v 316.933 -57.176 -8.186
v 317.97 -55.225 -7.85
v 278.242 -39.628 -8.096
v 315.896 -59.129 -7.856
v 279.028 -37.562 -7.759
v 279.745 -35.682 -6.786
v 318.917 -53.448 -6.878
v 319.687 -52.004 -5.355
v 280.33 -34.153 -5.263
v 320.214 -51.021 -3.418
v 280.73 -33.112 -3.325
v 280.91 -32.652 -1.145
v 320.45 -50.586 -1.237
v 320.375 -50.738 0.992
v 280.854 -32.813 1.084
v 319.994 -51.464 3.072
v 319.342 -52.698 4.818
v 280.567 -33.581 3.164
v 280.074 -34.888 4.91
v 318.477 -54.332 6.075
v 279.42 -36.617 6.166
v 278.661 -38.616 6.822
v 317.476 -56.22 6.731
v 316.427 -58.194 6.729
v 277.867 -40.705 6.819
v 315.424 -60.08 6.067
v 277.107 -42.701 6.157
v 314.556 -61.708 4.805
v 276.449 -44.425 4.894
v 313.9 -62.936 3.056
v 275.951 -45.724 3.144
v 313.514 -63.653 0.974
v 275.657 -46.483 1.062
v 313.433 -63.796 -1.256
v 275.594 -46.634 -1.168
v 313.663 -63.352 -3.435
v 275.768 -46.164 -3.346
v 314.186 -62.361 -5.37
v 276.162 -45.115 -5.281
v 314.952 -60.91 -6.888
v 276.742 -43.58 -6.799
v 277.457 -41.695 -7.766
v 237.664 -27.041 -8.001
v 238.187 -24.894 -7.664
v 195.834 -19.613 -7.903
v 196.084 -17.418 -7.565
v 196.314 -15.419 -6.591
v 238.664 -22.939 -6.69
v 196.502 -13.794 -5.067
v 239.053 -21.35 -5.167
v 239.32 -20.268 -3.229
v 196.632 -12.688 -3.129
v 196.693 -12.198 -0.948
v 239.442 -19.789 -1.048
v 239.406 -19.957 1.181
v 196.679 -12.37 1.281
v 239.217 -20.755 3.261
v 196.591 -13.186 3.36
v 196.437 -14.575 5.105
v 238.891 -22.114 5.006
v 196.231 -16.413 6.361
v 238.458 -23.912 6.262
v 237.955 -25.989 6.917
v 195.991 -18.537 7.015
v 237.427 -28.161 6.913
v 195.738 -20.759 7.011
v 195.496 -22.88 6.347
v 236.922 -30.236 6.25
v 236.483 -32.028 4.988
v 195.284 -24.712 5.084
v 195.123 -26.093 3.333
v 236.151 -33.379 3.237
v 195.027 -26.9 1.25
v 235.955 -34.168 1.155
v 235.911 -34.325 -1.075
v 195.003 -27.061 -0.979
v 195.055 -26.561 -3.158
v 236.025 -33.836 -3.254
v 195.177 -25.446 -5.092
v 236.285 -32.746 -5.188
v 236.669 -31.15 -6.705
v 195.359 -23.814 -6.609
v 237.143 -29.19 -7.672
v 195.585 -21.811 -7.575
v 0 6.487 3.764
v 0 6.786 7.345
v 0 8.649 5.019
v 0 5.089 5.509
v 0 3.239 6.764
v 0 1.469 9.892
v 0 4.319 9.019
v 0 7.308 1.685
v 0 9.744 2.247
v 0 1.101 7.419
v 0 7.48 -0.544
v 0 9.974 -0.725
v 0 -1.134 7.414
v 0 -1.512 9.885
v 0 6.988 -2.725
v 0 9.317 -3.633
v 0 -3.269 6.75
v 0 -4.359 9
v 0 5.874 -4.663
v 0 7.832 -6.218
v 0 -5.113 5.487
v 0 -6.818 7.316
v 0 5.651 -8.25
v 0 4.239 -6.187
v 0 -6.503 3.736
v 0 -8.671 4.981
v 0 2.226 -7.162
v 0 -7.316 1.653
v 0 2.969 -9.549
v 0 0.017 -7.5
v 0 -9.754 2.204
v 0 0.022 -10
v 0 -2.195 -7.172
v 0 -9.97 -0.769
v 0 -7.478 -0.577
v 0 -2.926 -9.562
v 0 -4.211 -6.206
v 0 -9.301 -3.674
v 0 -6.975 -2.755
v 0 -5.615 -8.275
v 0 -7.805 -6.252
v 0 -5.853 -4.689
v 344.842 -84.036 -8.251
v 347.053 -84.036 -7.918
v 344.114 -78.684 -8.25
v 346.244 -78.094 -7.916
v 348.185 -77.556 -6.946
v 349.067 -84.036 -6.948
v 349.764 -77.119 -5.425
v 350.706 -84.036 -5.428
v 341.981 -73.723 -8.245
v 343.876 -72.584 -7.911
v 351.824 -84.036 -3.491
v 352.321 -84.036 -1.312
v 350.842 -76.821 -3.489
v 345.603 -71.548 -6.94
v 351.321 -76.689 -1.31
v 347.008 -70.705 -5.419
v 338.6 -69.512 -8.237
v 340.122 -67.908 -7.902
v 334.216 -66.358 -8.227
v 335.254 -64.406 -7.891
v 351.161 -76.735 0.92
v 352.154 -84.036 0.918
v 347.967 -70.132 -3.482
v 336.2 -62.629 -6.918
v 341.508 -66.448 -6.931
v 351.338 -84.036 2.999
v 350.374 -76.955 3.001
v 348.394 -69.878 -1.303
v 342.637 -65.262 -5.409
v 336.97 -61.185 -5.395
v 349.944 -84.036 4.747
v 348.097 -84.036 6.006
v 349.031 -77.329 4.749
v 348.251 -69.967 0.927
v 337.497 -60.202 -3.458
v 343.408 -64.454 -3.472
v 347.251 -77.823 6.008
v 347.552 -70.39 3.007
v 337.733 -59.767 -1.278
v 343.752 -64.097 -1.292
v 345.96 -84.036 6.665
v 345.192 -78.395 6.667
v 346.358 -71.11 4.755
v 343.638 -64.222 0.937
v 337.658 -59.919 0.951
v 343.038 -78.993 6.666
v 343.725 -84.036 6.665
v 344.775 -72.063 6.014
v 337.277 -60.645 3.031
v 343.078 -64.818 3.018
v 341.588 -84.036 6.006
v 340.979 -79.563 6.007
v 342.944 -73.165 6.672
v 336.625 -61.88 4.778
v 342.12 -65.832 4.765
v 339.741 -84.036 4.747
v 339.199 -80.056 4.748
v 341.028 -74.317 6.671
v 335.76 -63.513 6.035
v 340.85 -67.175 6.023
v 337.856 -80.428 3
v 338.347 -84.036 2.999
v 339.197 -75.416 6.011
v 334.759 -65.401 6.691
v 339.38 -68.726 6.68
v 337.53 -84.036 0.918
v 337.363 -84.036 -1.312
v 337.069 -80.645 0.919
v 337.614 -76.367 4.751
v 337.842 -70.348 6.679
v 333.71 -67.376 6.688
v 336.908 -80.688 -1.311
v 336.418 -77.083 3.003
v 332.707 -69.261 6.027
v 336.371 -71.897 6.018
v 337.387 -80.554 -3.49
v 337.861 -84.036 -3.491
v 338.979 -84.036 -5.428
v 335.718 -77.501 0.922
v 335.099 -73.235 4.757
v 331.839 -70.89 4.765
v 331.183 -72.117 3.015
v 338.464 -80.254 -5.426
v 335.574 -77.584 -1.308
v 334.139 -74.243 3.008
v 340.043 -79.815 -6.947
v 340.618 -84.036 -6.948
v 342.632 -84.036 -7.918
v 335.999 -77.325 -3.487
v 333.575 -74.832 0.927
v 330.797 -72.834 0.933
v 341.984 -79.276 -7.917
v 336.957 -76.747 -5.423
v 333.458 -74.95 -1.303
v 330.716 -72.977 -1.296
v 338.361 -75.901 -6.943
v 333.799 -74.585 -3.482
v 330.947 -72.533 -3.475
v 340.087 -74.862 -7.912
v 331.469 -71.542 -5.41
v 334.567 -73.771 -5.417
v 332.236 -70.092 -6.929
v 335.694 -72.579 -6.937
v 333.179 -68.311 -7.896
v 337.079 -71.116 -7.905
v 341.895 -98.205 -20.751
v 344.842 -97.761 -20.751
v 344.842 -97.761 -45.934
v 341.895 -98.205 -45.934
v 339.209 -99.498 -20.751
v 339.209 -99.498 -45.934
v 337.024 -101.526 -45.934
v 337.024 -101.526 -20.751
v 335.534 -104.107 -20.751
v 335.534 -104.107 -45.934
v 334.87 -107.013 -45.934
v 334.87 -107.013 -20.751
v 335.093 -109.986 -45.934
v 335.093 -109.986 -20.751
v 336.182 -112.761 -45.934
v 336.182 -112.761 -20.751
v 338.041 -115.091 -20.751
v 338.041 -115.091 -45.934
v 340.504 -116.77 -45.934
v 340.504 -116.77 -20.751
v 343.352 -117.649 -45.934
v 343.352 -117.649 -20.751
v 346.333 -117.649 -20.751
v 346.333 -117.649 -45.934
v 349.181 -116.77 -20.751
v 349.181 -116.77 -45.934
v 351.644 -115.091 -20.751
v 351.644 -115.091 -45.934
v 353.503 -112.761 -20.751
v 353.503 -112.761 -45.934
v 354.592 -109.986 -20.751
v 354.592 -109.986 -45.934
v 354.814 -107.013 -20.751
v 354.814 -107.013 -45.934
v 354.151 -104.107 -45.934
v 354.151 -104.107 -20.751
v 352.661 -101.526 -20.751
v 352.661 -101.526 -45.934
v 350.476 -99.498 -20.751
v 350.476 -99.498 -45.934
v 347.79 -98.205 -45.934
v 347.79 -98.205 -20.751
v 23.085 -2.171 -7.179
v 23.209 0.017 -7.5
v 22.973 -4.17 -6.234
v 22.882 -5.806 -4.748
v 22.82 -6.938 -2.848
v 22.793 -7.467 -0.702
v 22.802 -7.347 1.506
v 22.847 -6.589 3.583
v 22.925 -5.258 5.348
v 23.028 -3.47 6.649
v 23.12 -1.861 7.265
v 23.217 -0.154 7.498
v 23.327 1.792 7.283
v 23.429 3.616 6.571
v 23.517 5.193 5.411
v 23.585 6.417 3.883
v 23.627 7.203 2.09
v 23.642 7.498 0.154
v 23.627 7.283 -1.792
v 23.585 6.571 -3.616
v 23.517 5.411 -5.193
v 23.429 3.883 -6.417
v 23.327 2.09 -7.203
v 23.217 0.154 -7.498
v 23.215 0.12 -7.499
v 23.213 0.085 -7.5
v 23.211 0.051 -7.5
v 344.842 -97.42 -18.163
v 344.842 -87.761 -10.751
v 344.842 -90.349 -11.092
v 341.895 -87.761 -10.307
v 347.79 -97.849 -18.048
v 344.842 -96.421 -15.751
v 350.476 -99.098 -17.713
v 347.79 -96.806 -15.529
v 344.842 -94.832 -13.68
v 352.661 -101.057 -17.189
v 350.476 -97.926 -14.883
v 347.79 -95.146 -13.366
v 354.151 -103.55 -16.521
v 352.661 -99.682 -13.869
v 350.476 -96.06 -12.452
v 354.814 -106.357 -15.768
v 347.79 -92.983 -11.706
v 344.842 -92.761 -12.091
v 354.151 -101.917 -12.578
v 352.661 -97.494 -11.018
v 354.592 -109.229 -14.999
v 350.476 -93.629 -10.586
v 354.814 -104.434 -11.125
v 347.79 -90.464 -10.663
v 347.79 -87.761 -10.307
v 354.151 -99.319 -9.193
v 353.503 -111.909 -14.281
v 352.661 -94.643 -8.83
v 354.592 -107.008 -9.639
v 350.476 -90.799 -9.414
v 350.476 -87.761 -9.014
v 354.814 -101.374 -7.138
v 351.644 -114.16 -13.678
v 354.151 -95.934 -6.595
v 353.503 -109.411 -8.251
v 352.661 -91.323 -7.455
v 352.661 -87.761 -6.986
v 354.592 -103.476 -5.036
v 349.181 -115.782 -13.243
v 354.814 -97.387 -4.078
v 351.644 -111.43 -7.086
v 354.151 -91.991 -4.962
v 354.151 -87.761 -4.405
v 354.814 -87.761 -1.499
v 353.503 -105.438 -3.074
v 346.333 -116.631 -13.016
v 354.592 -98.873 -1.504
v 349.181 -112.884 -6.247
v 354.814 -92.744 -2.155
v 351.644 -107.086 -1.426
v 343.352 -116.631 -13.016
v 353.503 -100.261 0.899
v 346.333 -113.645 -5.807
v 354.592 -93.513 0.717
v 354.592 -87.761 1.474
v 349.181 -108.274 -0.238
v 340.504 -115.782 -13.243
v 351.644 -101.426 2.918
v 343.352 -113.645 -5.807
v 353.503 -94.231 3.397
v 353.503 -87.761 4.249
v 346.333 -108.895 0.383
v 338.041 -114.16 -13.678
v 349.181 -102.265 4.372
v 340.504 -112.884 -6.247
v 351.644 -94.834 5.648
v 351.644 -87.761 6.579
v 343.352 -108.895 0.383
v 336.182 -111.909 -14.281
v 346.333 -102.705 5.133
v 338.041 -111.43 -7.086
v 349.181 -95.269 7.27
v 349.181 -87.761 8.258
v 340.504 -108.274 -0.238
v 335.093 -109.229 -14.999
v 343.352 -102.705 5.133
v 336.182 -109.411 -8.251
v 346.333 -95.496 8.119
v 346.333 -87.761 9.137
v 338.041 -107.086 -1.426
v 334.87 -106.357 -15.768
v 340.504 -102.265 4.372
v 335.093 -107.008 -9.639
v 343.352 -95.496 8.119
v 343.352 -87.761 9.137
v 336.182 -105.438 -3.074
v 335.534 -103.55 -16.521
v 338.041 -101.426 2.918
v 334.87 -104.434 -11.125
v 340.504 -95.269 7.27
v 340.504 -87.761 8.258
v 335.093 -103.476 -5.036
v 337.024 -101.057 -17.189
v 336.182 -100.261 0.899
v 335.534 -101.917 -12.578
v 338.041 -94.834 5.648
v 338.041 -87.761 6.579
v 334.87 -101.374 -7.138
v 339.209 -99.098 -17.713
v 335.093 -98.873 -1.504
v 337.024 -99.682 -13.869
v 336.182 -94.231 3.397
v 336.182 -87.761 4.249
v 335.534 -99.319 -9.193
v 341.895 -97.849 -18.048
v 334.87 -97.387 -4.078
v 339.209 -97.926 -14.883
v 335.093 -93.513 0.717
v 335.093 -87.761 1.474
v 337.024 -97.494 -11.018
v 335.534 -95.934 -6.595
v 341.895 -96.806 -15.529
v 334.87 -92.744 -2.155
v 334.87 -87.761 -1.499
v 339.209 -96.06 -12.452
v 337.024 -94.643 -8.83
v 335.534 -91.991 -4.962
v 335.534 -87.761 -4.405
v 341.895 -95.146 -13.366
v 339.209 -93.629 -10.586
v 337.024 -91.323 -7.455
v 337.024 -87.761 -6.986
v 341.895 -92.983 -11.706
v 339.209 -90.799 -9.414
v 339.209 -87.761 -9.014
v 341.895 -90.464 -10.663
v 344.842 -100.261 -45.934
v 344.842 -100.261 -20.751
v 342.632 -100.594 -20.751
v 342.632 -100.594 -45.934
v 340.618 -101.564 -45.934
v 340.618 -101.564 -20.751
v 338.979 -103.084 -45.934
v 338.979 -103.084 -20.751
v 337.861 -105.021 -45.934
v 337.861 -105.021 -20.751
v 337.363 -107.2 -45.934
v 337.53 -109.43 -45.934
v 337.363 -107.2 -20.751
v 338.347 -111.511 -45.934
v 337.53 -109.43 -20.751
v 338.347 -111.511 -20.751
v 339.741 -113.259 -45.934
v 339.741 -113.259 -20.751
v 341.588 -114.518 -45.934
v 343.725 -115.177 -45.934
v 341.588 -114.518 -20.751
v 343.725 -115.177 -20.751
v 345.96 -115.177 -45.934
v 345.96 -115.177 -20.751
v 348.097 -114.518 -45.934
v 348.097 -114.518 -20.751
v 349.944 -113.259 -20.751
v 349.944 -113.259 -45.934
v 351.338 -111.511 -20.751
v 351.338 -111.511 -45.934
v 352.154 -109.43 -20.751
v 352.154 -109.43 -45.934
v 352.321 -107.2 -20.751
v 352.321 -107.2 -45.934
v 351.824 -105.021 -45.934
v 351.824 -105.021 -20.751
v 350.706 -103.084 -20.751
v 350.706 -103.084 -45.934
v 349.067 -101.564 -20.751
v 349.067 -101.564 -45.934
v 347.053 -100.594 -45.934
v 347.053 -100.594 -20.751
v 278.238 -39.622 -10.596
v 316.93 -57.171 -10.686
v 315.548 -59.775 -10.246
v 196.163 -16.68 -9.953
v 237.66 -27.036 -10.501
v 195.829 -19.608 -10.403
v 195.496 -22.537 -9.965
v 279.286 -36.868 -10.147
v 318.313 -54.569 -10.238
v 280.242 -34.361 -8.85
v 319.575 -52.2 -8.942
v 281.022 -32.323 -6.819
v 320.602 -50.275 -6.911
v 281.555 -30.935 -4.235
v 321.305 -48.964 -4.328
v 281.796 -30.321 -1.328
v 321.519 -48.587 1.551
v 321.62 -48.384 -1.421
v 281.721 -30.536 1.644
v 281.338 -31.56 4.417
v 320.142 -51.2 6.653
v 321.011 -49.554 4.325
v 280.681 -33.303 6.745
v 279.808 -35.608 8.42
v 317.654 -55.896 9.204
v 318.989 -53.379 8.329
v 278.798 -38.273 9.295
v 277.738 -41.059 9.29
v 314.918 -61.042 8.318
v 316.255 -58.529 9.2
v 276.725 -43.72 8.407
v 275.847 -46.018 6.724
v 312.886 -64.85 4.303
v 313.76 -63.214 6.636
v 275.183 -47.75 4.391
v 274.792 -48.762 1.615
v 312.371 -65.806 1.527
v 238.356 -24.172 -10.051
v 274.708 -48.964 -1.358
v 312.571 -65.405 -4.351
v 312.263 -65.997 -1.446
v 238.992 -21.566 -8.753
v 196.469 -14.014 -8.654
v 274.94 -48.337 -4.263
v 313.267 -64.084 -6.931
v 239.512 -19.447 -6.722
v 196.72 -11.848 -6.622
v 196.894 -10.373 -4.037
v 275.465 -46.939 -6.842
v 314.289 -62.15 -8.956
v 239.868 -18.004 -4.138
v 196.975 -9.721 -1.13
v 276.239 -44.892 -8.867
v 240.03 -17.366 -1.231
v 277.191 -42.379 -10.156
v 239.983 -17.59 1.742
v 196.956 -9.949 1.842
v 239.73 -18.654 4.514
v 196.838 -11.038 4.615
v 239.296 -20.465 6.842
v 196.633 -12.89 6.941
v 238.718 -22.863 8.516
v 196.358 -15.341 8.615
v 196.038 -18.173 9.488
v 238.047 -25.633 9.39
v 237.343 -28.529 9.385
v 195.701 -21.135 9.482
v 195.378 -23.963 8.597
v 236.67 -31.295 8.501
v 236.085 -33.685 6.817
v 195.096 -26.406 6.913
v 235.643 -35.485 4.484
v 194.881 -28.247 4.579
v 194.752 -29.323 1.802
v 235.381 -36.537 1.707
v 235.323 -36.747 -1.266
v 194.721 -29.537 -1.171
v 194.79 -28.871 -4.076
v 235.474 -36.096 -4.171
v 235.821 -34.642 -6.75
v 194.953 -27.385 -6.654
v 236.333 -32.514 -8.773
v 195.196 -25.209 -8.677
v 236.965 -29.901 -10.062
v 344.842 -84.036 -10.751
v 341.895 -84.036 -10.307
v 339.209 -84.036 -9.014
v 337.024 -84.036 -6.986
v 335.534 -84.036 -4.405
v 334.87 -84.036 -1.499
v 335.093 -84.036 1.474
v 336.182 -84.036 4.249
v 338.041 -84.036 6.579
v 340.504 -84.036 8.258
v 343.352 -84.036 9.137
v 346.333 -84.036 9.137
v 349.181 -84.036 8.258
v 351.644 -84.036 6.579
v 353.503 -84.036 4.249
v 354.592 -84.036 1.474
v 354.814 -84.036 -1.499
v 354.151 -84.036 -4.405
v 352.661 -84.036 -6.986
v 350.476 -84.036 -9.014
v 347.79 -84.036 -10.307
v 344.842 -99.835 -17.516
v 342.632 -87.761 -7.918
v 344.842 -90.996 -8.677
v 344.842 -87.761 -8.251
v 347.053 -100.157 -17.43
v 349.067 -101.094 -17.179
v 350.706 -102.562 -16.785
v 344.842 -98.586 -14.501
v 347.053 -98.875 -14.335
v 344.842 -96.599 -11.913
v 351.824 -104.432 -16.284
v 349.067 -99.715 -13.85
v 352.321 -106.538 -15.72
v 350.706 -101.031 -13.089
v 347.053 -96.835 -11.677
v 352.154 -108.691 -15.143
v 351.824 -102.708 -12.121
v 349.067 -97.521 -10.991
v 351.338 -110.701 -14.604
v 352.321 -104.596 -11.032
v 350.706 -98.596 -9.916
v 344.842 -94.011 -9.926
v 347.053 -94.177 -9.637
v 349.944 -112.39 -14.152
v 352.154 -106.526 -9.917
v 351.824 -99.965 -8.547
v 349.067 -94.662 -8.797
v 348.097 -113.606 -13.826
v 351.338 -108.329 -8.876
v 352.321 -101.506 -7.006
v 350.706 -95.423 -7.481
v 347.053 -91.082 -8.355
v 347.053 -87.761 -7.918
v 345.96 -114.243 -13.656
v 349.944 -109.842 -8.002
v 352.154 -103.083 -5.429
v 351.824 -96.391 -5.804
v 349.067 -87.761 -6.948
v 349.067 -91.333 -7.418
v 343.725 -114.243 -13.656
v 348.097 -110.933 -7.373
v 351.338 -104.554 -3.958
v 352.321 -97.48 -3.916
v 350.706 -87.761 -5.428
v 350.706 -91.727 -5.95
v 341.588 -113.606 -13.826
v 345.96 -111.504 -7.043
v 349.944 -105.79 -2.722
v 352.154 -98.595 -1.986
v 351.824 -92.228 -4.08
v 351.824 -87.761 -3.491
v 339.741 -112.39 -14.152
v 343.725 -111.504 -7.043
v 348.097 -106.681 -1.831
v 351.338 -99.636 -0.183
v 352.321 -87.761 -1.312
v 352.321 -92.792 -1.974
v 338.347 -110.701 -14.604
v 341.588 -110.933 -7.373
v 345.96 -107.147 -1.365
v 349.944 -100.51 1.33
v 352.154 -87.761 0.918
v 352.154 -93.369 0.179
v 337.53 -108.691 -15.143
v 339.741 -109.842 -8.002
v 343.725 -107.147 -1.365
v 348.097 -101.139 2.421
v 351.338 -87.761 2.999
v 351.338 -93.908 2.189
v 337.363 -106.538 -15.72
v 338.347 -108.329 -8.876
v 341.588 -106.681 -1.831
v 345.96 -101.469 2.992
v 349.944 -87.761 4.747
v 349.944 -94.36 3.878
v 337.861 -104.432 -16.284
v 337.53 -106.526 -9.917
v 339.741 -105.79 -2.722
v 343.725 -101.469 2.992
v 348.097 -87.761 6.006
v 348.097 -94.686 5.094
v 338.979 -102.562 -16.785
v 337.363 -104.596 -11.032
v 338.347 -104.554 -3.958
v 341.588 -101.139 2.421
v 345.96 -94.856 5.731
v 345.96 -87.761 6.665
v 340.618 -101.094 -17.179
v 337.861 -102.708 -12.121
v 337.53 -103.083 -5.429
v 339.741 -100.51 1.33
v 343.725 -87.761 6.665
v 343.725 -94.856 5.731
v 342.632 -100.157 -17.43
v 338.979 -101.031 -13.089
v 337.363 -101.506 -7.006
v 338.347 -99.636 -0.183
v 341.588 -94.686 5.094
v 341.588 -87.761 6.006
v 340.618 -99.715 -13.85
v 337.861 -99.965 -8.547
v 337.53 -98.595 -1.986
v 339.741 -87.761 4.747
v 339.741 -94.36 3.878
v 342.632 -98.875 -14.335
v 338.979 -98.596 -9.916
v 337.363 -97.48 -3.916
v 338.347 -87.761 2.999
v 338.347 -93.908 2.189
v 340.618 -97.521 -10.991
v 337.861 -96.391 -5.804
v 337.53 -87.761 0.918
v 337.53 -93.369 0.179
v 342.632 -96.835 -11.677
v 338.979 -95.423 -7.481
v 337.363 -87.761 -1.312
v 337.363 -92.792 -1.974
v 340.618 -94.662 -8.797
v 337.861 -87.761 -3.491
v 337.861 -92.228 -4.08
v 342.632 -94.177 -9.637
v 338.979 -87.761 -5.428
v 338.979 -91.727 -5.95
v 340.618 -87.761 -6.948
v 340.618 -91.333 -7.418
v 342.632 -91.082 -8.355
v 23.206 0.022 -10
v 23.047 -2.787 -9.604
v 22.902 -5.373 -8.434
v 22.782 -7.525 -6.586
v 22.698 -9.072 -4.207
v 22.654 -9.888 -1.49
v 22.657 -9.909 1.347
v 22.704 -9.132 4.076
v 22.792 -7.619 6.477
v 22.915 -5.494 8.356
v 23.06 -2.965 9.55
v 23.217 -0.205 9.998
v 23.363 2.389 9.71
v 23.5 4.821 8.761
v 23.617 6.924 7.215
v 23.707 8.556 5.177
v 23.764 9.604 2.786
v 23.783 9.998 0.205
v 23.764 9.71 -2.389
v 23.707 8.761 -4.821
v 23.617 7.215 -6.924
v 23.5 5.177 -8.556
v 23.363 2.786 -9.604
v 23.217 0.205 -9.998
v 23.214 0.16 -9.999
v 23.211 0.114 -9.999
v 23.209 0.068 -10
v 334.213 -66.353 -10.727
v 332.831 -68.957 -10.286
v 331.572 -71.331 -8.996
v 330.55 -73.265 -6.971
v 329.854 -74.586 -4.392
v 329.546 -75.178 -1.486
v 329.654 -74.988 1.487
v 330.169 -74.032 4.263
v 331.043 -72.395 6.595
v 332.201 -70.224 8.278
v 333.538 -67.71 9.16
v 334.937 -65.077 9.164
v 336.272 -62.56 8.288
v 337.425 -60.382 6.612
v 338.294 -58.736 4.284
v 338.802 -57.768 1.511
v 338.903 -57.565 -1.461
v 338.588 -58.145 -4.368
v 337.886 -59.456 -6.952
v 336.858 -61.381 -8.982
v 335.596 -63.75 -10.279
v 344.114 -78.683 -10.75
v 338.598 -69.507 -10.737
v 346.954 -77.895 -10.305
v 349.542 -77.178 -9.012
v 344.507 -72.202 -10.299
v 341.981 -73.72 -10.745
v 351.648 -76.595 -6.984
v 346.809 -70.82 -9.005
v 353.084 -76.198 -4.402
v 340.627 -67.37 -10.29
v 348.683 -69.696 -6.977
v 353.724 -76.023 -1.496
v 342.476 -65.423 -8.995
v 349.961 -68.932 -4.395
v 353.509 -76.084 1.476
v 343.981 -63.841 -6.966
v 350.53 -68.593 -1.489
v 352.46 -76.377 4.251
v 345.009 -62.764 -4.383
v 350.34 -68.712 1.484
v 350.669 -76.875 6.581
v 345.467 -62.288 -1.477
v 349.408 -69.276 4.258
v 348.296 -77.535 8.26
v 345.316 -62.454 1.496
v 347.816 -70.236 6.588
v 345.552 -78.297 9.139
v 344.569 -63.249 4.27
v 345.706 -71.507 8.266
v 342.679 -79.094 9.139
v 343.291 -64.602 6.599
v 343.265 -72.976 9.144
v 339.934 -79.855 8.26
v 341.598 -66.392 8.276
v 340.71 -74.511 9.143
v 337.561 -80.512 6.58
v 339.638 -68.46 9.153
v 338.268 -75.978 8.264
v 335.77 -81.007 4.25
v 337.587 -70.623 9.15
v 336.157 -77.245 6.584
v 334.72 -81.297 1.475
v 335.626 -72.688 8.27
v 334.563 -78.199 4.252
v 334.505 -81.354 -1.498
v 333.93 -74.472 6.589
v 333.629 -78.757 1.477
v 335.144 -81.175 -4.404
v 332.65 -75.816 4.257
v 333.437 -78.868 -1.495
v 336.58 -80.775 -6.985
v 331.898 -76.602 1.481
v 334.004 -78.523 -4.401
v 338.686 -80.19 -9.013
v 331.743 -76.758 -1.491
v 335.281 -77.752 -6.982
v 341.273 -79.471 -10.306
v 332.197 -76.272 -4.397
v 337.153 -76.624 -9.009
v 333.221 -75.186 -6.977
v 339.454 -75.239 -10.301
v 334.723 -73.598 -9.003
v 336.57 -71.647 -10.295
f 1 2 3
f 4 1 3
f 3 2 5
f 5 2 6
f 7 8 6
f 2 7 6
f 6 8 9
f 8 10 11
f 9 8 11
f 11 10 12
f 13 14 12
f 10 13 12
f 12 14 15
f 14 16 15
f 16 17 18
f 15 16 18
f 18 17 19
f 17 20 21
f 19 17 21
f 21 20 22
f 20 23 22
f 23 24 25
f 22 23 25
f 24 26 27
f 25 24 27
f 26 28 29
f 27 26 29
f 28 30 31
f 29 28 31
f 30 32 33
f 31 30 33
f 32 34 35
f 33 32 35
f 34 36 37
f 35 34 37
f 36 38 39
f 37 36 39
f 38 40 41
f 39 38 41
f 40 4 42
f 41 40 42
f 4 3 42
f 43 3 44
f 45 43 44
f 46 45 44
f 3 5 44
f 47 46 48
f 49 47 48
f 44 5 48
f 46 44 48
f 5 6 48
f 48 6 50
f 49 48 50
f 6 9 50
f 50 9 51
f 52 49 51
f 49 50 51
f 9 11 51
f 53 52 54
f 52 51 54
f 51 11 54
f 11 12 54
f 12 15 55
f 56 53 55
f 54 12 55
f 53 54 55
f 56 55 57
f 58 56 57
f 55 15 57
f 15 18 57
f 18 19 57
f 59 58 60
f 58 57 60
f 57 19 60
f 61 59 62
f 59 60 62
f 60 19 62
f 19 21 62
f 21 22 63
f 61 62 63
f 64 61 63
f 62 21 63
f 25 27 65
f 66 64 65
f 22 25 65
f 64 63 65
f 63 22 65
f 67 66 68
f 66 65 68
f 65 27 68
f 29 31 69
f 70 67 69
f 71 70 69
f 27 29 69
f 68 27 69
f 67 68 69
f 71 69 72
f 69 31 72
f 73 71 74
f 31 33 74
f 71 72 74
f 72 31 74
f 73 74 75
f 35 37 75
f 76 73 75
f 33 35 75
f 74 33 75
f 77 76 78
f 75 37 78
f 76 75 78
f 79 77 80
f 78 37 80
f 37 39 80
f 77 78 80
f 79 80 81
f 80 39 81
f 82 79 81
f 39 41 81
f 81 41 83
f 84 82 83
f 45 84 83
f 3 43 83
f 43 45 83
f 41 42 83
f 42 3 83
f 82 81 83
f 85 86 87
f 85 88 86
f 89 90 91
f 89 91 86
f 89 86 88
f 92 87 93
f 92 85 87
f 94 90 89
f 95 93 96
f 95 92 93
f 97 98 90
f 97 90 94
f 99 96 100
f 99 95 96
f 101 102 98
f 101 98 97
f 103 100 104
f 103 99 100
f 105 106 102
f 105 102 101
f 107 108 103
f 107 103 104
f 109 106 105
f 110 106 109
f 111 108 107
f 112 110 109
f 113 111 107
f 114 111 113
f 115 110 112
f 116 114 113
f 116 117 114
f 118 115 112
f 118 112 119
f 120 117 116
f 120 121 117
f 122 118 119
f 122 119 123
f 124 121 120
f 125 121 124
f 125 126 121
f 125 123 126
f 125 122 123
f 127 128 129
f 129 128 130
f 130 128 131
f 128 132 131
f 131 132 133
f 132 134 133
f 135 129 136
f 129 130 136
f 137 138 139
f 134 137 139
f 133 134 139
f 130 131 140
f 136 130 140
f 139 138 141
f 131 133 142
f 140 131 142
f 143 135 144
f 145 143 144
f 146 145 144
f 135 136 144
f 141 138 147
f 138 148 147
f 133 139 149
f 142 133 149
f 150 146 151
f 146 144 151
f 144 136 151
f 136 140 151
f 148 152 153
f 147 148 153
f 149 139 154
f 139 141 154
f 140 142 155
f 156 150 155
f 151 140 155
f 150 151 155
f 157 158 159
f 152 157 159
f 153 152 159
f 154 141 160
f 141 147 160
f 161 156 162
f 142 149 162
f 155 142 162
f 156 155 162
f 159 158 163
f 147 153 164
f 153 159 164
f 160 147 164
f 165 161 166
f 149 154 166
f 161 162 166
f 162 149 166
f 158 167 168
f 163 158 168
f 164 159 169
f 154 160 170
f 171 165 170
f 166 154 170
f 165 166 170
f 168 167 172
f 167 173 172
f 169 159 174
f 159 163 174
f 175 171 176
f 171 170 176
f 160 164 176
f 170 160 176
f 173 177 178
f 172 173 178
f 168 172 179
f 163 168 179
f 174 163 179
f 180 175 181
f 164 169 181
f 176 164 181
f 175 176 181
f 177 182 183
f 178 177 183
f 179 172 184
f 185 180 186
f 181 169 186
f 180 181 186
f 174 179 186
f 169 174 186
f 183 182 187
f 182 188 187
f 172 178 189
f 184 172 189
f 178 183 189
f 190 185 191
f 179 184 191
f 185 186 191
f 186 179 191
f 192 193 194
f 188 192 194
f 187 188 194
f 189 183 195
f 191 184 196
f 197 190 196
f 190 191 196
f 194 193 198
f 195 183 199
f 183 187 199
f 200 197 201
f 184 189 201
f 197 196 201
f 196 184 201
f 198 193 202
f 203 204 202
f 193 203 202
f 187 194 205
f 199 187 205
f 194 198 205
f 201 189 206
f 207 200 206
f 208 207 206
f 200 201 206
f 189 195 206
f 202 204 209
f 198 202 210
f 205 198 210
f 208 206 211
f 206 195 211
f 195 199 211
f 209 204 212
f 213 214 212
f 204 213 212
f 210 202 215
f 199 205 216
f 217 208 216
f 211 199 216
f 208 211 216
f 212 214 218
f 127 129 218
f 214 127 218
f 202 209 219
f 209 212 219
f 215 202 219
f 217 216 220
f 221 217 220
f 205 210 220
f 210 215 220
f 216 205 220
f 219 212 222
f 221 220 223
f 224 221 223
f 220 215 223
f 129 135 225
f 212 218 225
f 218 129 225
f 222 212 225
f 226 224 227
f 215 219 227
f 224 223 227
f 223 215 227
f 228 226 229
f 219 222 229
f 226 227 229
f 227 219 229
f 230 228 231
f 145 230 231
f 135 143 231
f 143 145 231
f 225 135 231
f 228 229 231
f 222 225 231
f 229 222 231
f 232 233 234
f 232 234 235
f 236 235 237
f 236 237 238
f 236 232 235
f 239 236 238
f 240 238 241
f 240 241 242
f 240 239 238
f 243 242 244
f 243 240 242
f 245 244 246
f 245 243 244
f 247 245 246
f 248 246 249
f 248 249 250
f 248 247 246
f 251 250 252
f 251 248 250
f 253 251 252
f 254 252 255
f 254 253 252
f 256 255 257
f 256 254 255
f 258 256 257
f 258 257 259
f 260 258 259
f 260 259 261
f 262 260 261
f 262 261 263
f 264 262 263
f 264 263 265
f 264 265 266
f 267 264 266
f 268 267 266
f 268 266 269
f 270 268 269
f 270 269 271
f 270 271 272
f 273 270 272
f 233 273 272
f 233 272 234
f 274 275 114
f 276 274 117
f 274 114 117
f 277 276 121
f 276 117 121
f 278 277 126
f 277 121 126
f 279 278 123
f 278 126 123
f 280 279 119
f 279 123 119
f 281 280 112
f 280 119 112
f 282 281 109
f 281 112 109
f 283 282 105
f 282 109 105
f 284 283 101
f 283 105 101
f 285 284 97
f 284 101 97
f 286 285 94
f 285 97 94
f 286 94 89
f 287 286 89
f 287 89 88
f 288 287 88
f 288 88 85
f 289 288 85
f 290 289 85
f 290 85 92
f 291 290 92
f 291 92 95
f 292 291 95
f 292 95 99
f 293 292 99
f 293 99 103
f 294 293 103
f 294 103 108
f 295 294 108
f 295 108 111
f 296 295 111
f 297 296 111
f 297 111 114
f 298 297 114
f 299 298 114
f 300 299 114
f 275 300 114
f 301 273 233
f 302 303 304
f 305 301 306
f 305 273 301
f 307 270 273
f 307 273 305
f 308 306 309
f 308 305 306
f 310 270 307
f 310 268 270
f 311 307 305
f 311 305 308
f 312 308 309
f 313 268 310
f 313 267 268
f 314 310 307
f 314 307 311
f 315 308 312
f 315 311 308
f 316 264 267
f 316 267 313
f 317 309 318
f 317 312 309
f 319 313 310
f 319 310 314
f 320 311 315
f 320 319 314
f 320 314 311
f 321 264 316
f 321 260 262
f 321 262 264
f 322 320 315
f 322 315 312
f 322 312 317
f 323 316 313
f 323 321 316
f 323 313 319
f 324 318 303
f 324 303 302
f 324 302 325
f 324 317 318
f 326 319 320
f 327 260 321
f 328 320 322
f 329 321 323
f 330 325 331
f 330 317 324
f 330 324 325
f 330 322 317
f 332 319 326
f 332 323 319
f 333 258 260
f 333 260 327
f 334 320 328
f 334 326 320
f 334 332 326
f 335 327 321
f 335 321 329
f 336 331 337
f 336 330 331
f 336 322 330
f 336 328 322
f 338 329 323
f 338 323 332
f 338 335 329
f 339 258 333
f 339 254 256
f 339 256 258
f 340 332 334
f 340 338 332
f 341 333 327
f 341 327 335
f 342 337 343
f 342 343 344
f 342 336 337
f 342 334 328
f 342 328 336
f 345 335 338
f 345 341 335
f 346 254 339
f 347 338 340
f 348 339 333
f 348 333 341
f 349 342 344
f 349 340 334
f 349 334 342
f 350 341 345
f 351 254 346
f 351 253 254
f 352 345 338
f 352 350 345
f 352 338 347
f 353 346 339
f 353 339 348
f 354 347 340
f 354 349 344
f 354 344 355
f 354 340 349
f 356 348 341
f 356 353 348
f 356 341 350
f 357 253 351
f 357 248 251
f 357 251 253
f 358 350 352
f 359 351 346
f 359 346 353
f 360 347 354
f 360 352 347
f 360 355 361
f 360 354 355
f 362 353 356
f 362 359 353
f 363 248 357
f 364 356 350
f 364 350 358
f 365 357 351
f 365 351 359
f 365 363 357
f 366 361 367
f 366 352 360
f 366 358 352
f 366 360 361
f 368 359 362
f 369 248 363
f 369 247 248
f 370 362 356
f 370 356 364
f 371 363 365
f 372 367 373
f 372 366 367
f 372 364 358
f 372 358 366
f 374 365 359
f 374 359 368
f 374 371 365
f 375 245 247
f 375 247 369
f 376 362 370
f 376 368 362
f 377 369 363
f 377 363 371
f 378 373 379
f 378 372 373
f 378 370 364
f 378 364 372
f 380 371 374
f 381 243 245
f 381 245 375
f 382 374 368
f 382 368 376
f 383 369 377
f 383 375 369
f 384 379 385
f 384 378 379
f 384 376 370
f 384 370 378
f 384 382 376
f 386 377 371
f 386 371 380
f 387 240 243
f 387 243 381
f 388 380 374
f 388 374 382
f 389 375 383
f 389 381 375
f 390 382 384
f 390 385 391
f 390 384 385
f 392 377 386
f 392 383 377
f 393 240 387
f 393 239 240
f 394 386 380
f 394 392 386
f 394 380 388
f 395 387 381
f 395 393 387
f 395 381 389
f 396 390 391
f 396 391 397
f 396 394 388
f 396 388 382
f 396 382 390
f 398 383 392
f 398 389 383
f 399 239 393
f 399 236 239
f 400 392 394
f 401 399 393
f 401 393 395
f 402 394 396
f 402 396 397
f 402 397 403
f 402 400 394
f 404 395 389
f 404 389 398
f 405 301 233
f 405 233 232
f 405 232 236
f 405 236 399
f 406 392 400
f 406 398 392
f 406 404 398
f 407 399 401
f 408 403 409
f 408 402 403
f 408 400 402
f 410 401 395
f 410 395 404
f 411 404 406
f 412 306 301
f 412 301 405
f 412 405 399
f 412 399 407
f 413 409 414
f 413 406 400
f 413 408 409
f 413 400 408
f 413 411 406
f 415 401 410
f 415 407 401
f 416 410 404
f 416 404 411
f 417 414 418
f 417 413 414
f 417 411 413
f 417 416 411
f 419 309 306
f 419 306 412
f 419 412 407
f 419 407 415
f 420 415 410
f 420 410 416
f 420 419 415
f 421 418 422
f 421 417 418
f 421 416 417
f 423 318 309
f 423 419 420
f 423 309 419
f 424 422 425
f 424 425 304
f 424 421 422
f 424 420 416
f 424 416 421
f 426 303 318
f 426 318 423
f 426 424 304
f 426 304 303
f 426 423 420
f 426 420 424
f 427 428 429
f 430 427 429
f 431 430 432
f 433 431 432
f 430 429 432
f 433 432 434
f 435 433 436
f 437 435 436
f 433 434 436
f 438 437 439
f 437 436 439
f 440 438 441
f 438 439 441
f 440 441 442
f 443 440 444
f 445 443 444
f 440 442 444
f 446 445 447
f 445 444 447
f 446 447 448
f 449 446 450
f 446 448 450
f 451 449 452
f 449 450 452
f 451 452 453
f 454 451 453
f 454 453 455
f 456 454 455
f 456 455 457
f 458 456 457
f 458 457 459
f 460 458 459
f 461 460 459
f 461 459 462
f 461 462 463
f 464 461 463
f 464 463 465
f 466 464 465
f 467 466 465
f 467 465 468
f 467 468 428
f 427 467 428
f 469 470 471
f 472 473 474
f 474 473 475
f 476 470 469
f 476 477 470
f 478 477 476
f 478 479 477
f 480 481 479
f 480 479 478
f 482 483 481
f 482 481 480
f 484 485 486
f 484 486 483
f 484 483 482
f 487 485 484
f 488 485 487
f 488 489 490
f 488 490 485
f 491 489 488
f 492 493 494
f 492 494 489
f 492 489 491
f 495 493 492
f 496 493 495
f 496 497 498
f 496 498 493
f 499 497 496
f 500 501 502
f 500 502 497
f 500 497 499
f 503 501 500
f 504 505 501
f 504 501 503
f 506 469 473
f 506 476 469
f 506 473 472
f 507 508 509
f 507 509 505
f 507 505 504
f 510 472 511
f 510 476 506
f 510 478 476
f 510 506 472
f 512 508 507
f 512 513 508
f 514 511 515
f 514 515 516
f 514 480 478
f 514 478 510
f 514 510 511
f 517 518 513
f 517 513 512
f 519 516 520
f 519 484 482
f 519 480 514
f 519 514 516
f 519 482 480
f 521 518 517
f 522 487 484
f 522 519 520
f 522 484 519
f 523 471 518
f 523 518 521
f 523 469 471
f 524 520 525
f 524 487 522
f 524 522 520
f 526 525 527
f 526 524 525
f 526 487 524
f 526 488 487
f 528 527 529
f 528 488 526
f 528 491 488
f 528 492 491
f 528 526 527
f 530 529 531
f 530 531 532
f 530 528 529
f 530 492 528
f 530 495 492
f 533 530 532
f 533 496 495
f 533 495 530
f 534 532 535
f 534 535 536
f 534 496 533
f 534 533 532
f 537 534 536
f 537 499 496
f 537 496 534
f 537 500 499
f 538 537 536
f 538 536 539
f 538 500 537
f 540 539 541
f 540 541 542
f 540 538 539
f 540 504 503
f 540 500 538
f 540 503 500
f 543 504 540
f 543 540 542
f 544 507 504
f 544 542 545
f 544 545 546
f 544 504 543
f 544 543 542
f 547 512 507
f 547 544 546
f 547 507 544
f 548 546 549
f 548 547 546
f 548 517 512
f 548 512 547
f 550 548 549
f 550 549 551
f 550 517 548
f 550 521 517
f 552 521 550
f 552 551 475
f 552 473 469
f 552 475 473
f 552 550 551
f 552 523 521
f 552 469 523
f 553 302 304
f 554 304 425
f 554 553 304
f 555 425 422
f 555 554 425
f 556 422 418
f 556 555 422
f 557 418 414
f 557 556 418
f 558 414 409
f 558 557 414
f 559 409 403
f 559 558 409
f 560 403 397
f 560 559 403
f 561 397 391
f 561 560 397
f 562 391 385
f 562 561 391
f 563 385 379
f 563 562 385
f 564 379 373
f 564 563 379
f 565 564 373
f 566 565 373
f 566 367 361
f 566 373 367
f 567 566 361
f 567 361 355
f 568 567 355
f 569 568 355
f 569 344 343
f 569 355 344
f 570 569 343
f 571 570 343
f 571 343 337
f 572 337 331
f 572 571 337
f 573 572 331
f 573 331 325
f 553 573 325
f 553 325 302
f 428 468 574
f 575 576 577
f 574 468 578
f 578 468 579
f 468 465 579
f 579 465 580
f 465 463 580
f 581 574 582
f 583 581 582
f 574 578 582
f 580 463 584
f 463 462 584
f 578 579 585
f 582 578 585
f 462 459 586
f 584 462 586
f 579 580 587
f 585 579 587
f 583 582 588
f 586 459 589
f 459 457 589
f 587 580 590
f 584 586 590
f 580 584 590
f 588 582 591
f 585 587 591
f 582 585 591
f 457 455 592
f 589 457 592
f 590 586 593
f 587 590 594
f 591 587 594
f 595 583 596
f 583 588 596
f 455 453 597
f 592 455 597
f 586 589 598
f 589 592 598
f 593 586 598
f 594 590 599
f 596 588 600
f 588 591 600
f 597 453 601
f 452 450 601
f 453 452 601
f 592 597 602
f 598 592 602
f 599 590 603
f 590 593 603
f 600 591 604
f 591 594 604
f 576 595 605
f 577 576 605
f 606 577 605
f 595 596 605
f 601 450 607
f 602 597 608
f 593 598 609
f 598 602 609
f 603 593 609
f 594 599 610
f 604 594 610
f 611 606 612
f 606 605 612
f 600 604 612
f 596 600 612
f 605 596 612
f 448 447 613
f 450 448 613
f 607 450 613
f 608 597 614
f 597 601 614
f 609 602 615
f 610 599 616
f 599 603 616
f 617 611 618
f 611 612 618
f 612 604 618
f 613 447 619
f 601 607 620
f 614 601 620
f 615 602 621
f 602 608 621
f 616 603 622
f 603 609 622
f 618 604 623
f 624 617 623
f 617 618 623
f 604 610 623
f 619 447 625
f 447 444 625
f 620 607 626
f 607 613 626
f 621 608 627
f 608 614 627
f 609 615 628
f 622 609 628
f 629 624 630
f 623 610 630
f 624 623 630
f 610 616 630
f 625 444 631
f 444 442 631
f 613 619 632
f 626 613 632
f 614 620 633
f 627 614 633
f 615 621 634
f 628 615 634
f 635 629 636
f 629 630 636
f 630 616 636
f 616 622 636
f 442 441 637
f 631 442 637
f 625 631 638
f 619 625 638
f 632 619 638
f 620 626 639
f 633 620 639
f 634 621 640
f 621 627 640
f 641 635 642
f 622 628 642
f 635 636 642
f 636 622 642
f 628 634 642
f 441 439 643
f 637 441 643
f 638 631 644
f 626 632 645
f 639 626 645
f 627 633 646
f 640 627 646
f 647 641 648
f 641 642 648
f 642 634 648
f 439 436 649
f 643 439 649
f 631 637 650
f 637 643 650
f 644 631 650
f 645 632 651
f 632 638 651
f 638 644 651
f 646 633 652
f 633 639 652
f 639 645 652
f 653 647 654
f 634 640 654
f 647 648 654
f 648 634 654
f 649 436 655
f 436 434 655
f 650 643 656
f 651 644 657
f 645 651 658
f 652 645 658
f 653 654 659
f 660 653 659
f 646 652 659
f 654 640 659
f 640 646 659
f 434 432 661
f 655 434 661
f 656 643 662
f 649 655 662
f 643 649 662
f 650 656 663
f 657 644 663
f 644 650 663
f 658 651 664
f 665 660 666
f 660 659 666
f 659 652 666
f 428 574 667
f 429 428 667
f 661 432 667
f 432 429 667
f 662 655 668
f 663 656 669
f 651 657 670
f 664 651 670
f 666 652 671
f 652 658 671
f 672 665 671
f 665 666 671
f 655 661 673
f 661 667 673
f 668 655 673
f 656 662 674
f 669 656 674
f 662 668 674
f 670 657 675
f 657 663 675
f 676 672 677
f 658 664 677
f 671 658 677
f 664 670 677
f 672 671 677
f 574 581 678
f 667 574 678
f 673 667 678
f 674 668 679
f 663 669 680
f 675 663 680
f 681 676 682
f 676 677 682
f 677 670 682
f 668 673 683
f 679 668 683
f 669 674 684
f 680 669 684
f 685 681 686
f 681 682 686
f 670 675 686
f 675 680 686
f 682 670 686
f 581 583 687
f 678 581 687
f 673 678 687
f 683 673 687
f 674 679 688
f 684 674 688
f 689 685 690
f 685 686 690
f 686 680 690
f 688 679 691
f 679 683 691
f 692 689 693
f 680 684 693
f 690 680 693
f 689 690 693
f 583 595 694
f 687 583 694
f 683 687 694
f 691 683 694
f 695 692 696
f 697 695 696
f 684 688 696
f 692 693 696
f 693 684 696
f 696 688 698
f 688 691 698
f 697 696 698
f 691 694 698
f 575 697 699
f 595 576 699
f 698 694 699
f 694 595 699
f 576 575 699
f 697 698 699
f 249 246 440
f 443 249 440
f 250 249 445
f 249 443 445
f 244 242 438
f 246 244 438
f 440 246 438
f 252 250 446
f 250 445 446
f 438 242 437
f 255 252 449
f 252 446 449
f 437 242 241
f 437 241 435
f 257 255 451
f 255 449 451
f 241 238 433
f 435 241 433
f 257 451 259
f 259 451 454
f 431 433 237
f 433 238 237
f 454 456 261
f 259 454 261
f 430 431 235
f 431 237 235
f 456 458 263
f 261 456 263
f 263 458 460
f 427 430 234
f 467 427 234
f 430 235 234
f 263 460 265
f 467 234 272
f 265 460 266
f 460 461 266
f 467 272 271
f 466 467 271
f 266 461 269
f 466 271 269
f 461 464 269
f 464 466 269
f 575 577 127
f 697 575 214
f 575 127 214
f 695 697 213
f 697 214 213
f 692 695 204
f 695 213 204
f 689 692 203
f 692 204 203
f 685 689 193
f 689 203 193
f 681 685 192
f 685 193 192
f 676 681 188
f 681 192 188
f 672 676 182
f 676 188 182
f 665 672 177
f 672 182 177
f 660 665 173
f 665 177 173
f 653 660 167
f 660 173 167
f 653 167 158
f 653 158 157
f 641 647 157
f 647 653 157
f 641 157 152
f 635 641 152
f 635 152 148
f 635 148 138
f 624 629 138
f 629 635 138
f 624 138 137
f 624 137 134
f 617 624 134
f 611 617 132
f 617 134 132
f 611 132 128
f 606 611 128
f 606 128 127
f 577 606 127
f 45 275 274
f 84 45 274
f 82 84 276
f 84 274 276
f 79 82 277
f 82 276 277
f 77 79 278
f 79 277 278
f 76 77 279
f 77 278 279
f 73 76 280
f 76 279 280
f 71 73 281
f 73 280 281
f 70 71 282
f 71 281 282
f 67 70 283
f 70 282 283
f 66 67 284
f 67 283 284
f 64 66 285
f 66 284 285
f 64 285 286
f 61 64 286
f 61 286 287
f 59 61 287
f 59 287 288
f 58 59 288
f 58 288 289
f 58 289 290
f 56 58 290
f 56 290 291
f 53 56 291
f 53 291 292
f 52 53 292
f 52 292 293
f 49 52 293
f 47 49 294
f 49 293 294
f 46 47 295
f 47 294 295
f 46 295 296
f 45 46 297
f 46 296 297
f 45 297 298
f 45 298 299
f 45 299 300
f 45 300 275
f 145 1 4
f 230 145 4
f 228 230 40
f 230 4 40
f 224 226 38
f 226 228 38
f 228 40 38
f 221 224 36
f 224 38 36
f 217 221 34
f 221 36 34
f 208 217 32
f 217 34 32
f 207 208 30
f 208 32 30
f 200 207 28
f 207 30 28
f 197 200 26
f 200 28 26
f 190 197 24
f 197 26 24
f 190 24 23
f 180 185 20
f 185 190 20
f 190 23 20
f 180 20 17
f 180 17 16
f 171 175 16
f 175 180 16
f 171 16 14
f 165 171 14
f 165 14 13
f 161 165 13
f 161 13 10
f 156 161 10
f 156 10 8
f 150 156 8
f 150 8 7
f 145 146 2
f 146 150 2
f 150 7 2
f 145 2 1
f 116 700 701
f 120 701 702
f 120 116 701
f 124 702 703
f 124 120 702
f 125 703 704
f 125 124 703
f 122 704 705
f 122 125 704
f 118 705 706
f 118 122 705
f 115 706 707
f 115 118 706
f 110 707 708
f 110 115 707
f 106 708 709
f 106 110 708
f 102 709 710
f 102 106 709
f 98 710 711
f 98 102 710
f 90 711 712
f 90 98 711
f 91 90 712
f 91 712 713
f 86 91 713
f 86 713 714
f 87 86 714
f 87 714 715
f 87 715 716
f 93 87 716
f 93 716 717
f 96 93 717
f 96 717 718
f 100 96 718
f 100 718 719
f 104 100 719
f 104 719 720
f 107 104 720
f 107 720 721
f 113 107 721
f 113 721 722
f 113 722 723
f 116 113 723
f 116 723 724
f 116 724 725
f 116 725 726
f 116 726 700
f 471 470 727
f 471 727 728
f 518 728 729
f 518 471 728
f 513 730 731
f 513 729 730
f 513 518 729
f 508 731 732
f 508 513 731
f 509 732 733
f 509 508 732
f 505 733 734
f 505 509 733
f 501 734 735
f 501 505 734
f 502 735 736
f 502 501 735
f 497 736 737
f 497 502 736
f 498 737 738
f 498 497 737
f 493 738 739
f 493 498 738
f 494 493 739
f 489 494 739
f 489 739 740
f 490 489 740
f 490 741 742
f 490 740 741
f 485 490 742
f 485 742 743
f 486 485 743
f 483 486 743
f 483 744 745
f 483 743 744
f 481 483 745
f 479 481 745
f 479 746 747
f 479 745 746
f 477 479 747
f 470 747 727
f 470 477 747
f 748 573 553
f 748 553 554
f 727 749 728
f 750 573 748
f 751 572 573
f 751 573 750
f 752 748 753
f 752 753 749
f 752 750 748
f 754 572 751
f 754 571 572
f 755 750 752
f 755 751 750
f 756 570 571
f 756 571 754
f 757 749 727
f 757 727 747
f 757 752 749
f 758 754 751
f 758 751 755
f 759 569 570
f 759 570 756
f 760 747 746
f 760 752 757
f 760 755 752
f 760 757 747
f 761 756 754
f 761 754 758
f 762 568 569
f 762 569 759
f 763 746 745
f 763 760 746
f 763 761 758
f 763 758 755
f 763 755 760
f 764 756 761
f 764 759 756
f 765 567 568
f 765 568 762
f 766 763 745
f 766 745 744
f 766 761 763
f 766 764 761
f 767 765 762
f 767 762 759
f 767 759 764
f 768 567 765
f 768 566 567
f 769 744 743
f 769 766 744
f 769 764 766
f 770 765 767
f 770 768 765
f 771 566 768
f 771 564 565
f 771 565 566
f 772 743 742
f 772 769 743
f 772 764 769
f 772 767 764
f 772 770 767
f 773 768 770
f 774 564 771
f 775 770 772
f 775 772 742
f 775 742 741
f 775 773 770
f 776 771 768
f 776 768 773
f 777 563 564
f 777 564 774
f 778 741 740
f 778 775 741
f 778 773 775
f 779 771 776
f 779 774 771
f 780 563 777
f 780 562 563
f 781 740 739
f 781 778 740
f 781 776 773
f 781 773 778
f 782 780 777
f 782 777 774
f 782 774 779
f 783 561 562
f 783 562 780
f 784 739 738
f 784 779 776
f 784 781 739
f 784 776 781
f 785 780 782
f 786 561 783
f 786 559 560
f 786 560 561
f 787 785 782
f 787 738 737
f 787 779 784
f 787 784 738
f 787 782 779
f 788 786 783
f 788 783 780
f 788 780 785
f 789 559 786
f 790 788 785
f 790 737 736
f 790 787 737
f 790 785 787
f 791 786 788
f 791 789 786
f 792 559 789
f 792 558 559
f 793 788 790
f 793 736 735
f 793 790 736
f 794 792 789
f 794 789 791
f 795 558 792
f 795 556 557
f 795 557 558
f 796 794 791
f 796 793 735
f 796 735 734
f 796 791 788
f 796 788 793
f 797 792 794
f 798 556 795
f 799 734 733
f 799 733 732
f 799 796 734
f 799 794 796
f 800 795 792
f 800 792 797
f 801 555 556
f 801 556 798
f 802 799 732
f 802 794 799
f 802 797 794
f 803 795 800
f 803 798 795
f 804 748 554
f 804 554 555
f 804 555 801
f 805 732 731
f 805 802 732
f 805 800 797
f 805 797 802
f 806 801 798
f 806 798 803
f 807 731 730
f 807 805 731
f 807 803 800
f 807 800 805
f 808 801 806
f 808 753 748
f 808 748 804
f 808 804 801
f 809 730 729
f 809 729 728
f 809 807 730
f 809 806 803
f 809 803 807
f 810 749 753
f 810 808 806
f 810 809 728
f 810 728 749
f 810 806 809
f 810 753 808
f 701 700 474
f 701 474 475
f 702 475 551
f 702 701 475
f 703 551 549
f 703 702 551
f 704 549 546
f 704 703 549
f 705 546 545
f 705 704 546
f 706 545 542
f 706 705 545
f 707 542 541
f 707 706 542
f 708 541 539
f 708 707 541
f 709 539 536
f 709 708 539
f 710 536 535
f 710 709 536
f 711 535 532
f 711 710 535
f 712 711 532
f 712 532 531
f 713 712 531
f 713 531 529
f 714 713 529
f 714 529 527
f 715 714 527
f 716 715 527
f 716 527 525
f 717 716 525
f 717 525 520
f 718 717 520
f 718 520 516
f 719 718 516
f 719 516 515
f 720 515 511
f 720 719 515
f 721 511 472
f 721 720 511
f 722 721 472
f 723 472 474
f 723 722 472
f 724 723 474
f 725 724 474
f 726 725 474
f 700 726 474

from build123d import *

# Parameters (mm, degrees)
WYCI_GNI_CIE_PO_CIE_CE_CIENKA_CIAN_2_R   = 10
WYCI_GNI_CIE_PO_CIE_CE_CIENKA_CIAN_2_R_2 = 7.5


with BuildPart() as part:
    # Wyci_gni_cie po _cie_ce-Cienka _cianka1: sweep along a curve in space
    with BuildLine() as wyci_gni_cie_po_cie_ce_cienka_cianka1_path:
        Line((344.842449098, -107.760635274, -45.933666989), (344.842449098, -107.760635274, -30.175831262))
        Line((344.842449098, -107.760635274, -30.175831262), (344.842449098, -107.760635274, -20.751368547))
        ThreePointArc((344.842449098, -107.760635274, -20.751368547), (344.842449098, -101.902770898, -6.609232923), (344.842449098, -87.760635274, -0.751368547))
        Line((344.842449098, -87.760635274, -0.751368547), (344.842449098, -84.035691476, -0.751368547))
        ThreePointArc((334.225321639, -66.373238459, -0.72656527), (341.983881451, -73.731732804, -0.744690484), (344.842449098, -84.035691476, -0.751368547))
        Line((334.225321639, -66.373238459, -0.72656527), (316.94225441, -57.191911349, -0.686189311))
        ThreePointArc((316.94225441, -57.191911349, -0.686189311), (258.162073815, -32.716996153, -0.548869578), (195.849321408, -19.630756919, -0.403297204))
        Line((195.849321408, -19.630756919, -0.403297204), (23.216575519, 0, 0))
        Line((23.216575519, 0, 0), (0, 0, 0))
    # Wyci_gni_cie po _cie_ce-Cienka _cian 2 (on start of the path) → Wyci_gni_cie po _cie_ce-Cienka _cianka1 (sweep)
    with BuildSketch(Plane(origin=(344.842449098, -107.760635274, -45.933666989), x_dir=(0, 1, 0), z_dir=(0, 0, 1))):
        Circle(WYCI_GNI_CIE_PO_CIE_CE_CIENKA_CIAN_2_R)
        Circle(WYCI_GNI_CIE_PO_CIE_CE_CIENKA_CIAN_2_R_2, mode=Mode.SUBTRACT)
    sweep(path=wyci_gni_cie_po_cie_ce_cienka_cianka1_path.line, transition=Transition.RIGHT)


solid = part.part
